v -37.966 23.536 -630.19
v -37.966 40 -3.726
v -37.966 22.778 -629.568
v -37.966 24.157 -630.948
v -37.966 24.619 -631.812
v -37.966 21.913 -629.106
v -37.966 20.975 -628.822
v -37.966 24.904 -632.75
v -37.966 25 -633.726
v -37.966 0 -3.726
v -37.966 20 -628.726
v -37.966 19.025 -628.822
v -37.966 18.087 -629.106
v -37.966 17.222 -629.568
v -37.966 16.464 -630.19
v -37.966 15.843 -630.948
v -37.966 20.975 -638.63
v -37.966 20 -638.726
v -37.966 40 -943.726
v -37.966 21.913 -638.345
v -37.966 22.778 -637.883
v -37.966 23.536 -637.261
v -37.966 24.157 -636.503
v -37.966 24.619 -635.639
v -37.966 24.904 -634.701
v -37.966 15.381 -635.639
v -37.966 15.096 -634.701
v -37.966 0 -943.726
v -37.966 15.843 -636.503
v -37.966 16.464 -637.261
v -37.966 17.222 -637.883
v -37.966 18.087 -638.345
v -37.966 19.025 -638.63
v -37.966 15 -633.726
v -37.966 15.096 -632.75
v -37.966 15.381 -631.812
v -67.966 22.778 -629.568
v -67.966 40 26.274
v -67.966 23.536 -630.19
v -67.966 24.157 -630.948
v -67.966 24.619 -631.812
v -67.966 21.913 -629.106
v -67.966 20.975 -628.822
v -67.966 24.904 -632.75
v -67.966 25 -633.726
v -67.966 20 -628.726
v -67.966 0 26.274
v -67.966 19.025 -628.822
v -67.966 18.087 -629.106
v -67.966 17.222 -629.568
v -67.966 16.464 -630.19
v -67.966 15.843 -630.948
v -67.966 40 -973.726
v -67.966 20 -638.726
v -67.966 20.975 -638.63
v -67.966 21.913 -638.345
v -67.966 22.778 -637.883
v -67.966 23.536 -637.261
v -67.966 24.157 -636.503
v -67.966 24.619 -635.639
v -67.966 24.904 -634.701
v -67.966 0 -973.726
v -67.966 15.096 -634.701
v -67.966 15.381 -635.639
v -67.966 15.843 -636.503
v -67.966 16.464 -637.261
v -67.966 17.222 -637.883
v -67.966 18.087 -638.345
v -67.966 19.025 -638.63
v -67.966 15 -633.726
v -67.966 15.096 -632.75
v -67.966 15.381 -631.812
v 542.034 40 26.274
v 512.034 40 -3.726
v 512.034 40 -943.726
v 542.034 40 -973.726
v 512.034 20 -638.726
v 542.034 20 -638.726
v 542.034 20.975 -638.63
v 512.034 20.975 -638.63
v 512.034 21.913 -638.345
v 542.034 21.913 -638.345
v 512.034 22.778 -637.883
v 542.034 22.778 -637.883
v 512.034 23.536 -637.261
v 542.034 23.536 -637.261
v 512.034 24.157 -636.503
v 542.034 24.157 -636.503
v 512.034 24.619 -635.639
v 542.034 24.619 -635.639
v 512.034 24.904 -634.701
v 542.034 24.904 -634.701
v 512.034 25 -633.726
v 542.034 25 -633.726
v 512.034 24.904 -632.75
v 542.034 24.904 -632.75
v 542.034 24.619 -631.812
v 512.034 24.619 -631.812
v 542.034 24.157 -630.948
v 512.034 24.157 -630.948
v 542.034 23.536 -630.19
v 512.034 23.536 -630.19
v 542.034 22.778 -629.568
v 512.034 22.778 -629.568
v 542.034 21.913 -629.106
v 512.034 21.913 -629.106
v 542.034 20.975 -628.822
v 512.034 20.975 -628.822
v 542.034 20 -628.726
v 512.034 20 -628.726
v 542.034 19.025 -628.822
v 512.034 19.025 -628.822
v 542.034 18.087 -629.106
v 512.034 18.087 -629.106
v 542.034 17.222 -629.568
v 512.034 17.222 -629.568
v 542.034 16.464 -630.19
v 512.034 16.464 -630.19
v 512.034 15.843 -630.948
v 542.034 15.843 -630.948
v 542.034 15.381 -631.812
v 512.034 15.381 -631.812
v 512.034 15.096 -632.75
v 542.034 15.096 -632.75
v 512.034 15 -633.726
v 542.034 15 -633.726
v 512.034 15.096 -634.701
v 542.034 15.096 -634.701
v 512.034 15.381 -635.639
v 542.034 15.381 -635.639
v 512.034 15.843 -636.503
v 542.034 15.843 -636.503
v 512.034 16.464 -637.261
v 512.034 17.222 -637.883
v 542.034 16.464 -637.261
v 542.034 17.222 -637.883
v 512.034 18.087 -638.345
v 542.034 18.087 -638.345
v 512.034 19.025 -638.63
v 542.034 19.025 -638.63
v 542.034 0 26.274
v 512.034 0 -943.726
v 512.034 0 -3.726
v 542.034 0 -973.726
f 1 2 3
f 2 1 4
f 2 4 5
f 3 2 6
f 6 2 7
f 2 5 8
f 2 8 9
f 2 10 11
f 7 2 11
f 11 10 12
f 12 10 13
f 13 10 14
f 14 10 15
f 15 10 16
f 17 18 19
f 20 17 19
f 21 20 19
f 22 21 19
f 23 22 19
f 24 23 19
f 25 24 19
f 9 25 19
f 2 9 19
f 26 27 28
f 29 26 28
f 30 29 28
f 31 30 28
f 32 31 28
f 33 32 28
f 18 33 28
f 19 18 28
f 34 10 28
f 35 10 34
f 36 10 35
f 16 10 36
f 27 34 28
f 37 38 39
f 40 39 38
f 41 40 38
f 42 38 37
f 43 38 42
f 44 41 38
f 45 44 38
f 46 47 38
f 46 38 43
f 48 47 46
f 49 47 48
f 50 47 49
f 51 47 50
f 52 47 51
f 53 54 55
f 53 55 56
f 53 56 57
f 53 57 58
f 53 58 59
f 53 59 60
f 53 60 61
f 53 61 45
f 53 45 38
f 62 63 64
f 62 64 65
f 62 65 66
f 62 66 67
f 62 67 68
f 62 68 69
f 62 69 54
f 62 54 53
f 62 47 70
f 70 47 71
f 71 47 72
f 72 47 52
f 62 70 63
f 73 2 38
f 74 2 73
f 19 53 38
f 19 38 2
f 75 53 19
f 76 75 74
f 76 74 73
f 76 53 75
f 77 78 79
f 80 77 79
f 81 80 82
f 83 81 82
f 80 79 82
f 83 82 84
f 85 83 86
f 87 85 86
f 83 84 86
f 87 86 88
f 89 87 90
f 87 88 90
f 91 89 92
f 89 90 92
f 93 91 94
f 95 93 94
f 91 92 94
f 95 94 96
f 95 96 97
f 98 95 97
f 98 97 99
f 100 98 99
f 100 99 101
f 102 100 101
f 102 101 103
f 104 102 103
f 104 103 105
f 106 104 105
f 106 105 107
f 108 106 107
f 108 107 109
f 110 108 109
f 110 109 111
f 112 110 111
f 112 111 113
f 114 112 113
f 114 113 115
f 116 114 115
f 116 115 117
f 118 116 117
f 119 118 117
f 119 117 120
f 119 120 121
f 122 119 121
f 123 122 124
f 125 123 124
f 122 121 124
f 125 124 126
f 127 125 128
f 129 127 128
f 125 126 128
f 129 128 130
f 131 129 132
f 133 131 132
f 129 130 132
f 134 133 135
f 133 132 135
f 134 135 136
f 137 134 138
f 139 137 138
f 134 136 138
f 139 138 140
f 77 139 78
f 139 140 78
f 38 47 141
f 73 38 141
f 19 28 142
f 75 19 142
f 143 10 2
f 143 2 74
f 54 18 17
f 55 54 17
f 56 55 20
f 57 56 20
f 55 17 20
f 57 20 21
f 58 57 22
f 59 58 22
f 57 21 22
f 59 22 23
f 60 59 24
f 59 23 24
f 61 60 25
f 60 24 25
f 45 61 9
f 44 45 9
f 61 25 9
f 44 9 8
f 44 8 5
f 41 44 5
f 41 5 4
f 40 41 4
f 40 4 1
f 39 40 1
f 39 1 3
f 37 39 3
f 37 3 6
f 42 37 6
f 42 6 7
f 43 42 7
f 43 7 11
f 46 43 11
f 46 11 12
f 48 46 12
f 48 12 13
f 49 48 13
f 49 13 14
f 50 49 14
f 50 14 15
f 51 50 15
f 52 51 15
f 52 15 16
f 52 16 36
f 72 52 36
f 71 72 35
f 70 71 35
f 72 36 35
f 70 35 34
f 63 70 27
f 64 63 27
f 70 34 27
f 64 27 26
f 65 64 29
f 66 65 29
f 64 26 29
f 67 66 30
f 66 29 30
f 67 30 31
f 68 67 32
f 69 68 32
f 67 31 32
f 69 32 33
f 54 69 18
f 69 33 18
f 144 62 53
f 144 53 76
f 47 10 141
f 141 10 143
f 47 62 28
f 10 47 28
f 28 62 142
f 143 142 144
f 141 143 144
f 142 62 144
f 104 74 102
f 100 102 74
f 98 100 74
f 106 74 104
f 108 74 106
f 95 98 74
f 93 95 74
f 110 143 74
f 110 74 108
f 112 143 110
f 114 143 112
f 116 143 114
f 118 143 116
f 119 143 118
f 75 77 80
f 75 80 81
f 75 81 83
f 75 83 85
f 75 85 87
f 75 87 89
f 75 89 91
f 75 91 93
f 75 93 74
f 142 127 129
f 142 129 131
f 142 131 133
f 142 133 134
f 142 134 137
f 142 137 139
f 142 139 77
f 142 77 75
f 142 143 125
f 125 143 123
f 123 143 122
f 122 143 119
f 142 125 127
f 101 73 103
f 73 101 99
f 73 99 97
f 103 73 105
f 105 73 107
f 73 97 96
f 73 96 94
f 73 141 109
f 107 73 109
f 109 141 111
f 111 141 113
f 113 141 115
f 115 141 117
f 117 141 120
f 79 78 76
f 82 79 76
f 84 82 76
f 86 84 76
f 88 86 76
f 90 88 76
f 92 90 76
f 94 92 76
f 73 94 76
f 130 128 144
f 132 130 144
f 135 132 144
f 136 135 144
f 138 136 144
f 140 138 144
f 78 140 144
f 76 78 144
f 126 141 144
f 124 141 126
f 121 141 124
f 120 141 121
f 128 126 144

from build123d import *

# Parameters (mm, degrees)
SKETCH_1_W          = 610
SKETCH_1_H          = 1000
SKETCH_1_W_2        = 550
SKETCH_1_H_2        = 940
EXTRUDE_1_DEPTH     = 40
SKETCH_2_R          = 5
CUT_EXTRUDE_1_DEPTH = 611


with BuildPart() as part:
    # Эскиз1 → Бобышка-Вытянуть1 (new body)
    with BuildSketch(Plane(origin=(0, 0, 0), x_dir=(1, 0, 0), z_dir=(0, 1, 0))):
        with Locations((237.034264066, 473.725626833)):
            Rectangle(SKETCH_1_W, SKETCH_1_H)
        with Locations((237.034264066, 473.725626833)):
            Rectangle(SKETCH_1_W_2, SKETCH_1_H_2, mode=Mode.SUBTRACT)
    extrude(amount=EXTRUDE_1_DEPTH)

    # Эскиз2 → Вырез-Вытянуть1 (cut, through all)
    with BuildSketch(Plane(origin=(542.034264066, 0, 0), x_dir=(0, 0, -1), z_dir=(1, 0, 0))):
        with Locations((633.725626833, 20)):
            Circle(SKETCH_2_R)
    extrude(amount=-CUT_EXTRUDE_1_DEPTH, mode=Mode.SUBTRACT)


solid = part.part
